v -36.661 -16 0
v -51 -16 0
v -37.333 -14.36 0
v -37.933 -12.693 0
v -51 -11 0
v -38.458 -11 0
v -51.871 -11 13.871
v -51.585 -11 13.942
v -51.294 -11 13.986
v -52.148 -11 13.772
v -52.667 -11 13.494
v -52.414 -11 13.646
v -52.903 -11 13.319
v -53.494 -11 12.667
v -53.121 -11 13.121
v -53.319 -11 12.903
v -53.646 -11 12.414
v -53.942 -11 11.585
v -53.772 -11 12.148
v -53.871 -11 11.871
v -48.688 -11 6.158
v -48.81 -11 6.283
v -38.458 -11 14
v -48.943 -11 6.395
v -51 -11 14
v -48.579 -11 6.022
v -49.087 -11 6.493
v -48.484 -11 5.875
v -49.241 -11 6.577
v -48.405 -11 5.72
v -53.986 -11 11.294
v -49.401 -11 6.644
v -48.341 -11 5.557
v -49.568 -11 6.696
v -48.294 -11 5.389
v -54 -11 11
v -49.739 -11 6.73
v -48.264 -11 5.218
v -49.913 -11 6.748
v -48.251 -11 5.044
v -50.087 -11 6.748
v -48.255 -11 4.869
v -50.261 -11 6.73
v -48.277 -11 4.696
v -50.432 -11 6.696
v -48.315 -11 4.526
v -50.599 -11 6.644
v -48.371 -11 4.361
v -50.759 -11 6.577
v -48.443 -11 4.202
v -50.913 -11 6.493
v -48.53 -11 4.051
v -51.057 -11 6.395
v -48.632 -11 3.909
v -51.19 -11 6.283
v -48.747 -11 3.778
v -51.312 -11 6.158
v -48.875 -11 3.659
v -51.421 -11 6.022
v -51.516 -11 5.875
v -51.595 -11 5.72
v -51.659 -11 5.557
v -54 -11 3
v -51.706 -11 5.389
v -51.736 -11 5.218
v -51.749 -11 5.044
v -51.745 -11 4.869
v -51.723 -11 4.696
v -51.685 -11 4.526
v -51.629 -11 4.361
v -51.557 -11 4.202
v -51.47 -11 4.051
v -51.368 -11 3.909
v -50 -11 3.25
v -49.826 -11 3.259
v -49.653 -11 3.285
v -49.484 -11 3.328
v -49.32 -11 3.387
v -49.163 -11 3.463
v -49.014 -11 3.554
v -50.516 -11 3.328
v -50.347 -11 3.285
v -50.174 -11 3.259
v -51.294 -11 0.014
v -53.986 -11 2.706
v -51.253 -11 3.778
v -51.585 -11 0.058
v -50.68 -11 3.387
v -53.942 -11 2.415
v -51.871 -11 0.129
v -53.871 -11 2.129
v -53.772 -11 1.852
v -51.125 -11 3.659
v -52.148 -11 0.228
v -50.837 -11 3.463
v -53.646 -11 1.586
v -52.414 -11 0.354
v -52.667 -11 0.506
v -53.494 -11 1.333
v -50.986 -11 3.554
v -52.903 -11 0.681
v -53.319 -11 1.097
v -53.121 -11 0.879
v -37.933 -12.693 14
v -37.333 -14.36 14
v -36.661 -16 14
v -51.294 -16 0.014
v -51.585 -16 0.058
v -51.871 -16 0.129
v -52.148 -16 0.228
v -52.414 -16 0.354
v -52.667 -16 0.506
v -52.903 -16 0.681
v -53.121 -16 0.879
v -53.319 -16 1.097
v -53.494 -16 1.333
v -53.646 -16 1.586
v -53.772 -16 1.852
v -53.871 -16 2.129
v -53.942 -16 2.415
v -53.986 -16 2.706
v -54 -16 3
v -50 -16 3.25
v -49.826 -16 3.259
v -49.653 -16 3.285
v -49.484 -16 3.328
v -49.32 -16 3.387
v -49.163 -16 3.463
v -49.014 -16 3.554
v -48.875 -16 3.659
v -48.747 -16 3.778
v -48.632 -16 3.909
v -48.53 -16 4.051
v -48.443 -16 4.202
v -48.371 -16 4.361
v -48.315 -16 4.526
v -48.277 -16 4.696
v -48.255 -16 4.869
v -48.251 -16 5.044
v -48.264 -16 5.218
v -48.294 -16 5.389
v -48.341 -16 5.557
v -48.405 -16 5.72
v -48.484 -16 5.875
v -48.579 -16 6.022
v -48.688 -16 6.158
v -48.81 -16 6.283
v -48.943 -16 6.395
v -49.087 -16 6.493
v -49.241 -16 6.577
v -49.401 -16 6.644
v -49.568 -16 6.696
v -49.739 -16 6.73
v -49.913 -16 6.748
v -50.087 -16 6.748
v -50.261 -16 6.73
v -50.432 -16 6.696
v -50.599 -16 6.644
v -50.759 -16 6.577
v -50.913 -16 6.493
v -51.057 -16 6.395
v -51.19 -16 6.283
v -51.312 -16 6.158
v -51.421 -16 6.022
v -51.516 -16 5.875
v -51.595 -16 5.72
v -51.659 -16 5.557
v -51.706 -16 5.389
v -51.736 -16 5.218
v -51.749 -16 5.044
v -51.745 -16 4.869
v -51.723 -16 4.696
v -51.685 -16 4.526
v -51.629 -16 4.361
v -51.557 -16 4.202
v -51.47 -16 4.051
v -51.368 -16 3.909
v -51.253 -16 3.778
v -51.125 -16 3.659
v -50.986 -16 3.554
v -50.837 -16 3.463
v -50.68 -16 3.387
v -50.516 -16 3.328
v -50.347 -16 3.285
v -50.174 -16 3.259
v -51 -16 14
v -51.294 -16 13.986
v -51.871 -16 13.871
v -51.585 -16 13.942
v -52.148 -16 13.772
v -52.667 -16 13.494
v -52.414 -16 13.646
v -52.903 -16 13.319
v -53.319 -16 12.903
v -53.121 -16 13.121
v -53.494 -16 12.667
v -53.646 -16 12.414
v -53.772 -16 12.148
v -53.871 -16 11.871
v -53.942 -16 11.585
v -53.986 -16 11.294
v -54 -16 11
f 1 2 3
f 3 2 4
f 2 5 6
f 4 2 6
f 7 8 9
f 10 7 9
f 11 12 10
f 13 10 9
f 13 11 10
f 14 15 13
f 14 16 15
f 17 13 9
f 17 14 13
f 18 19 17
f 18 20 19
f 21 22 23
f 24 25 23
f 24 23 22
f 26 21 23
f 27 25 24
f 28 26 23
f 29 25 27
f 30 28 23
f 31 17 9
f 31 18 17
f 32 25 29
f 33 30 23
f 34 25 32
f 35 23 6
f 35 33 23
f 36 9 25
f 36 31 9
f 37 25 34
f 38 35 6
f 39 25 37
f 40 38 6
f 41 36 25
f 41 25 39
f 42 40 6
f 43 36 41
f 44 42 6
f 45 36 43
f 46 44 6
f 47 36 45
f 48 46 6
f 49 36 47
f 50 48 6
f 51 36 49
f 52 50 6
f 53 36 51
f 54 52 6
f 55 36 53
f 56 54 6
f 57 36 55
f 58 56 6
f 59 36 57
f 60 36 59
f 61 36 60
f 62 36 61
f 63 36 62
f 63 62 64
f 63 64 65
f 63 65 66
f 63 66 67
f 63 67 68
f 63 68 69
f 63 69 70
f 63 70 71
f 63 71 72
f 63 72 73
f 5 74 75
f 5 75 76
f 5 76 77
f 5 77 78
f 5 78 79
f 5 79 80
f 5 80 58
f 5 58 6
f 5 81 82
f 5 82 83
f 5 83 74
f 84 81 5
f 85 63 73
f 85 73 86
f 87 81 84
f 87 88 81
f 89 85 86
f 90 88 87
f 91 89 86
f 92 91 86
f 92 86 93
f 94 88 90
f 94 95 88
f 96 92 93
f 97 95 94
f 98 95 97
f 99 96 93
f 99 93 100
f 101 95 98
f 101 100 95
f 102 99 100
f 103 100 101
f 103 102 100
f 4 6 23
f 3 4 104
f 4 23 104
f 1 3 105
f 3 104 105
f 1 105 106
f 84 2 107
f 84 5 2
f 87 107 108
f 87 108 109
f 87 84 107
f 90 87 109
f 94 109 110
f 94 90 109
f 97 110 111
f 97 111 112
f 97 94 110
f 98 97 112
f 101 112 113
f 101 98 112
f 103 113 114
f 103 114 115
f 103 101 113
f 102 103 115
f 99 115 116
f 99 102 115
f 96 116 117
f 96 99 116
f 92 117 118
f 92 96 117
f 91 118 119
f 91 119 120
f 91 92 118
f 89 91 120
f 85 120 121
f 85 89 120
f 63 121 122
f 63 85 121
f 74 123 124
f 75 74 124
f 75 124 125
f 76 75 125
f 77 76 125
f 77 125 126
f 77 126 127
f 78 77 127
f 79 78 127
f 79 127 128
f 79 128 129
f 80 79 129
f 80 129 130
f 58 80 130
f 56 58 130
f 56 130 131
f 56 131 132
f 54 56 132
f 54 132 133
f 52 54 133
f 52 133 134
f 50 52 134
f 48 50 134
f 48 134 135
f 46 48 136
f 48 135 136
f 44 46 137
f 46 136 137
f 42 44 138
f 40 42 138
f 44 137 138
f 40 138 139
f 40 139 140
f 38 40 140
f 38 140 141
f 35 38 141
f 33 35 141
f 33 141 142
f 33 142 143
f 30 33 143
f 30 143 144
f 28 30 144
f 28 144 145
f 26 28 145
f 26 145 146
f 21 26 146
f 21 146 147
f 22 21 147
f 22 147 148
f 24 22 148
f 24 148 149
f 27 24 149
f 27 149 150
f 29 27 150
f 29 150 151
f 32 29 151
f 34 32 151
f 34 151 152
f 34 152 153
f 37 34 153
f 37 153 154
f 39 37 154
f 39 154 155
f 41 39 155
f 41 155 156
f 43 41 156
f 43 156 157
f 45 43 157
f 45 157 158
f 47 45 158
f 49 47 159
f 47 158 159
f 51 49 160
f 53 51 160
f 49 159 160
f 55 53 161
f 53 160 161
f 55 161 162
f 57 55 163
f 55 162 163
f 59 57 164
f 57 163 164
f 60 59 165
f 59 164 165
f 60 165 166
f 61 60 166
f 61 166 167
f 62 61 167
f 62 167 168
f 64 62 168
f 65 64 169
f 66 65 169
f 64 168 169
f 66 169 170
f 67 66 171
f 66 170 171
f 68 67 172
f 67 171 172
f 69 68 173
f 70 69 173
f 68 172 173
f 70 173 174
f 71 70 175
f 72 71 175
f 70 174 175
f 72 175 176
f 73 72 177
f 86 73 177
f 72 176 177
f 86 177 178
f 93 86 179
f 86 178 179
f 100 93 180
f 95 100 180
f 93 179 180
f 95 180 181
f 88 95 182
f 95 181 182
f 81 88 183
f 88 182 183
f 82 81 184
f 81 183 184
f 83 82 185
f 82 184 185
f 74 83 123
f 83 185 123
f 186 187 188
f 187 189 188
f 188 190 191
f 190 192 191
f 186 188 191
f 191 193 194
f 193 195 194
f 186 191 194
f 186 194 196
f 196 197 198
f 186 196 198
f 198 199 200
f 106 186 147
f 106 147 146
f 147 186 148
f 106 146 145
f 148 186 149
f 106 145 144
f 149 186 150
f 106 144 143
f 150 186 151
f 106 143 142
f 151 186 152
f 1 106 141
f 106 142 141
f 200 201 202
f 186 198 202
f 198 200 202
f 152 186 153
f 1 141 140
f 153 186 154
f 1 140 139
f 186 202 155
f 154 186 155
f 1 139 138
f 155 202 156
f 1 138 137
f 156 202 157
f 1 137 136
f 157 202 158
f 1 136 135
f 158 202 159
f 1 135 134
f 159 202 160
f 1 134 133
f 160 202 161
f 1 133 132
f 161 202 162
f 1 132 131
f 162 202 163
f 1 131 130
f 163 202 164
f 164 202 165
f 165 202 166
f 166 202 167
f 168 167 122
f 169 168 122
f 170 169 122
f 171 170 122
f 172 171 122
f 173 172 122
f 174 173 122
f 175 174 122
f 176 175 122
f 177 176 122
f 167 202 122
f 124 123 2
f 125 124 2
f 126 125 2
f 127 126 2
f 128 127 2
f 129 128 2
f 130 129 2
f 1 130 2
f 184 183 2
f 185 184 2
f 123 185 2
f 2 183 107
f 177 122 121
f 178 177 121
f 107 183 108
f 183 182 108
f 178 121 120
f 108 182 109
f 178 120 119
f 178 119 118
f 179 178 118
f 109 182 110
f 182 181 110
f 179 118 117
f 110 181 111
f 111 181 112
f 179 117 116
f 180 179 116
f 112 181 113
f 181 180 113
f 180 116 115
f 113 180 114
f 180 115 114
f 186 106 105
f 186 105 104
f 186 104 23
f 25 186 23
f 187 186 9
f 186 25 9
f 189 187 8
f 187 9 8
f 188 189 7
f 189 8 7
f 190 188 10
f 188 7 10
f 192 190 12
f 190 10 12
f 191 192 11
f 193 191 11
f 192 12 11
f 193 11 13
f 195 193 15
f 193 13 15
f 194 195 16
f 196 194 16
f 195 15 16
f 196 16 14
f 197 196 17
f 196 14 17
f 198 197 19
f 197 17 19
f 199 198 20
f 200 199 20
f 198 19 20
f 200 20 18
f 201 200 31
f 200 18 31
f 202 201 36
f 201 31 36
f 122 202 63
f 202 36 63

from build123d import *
from build123d.topology import SkipClean

# Parameters (mm, degrees)
SKETCH1_R                      = 40
SKETCH1_R_2                    = 38
BOSS_EXTRUDE1_DEPTH            = 200
SKETCH2_R                      = 40
BOSS_EXTRUDE2_DEPTH            = 2
BOSS_EXTRUDE3_DEPTH            = 107
BOSS_EXTRUDE4_DEPTH            = 2
SKETCH5_R                      = 1.75
CUT_EXTRUDE1_DEPTH             = 225.428162226
CUT_EXTRUDE2_REACH             = 218.296
SKETCH6_R                      = 4
CUT_EXTRUDE2_DIRECTION_2_REACH = 218.296
CIRPATTERN1_COUNT              = 2
CIRPATTERN1_ANGLE              = 90
BOSS_EXTRUDE5_REACH            = 241.742
BOSS_EXTRUDE5_END_RADIUS       = 40
SKETCH7_W                      = 14
SKETCH7_H                      = 5
CUT_EXTRUDE3_REACH             = 221.818
SKETCH8_R                      = 1.75
FILLET1_R                      = 3
CUT_EXTRUDE4_REACH             = 220.598
SKETCH9_R                      = 0.25
BOSS_EXTRUDE6_START            = 2
BOSS_EXTRUDE6_DEPTH            = 2
CUT_EXTRUDE5_REACH             = 220.147


with BuildPart() as part:
    # Sketch1 → Boss-Extrude1 (new body)
    with BuildSketch(Plane.XY):
        Circle(SKETCH1_R)
        Circle(SKETCH1_R_2, mode=Mode.SUBTRACT)
    extrude(amount=BOSS_EXTRUDE1_DEPTH)

    # Sketch2 → Boss-Extrude2 (add)
    with BuildSketch(Plane.XY.offset(180)):
        Circle(SKETCH2_R)
    extrude(amount=BOSS_EXTRUDE2_DEPTH)

    # Sketch3 → Boss-Extrude3 (add)
    with BuildSketch(Plane(origin=(0, 0, 0), x_dir=(-1, 0, 0), z_dir=(0, 0, -1))):
        with BuildLine():
            Line((-24, -32), (-72, -32))
            Line((-72, -32), (-72, -30))
            Line((-72, -30), (-26.457513111, -30))
            ThreePointArc((-26.457513111, -30), (-25.248567431, -31.024342744), (-24, -32))
        make_face()
        with BuildLine():
            Line((-24, 32), (-72, 32))
            Line((-72, 32), (-72, 30))
            Line((-72, 30), (-26.457513111, 30))
            ThreePointArc((-26.457513111, 30), (-25.248567431, 31.024342744), (-24, 32))
        make_face()
    extrude(amount=-BOSS_EXTRUDE3_DEPTH)

    # Sketch4 → Boss-Extrude4 (add)
    with BuildSketch(Plane.XY.offset(107)):
        with BuildLine():
            Line((72, -32), (24, -32))
            ThreePointArc((24, -32), (40, 0), (24, 32))
            Line((24, 32), (72, 32))
            Line((72, 32), (72, -32))
        make_face()
    extrude(amount=BOSS_EXTRUDE4_DEPTH)

    # Sketch5 → Cut-Extrude1 (cut, through all)
    with BuildSketch(Plane(origin=(0, 32, 0), x_dir=(1, 0, 0), z_dir=(0, 1, 0))):
        with Locations(Location((43.5, -102.5, 0), (0, 0, 270))):
            Circle(SKETCH5_R)
        with Locations(Location((43.5, -3.5, 0), (0, 0, 270))):
            Circle(SKETCH5_R)
        with Locations(Location((68.5, -78, 0), (0, 0, 270))):
            Circle(SKETCH5_R)
    extrude(amount=-CUT_EXTRUDE1_DEPTH, mode=Mode.SUBTRACT)

    # Sketch6 → Cut-Extrude2 (cut, up to next)
    with BuildSketch(Plane(origin=(0, 0, 0), x_dir=(0, 0, 1), z_dir=(-0.7071067811865488, 0.7071067811865464, 0)), mode=Mode.PRIVATE) as cut_extrude2_sk1:
        with Locations(Location((187, 0, 0), (0, 0, 90))):
            Circle(SKETCH6_R)
    cut_extrude2_tool1 = extrude(cut_extrude2_sk1.sketch, amount=-CUT_EXTRUDE2_REACH, mode=Mode.PRIVATE) & part.part
    cut_extrude2 = cut_extrude2_tool1.solids().sort_by_distance((0, 0, 187))[0]
    add(cut_extrude2, mode=Mode.SUBTRACT)

    # Sketch6 → Cut-Extrude2 direction 2 (cut, up to next)
    with BuildSketch(Plane(origin=(0, 0, 0), x_dir=(0, 0, 1), z_dir=(-0.7071067811865488, 0.7071067811865464, 0)), mode=Mode.PRIVATE) as cut_extrude2_direction_2_sk1:
        with Locations(Location((187, 0, 0), (0, 0, 90))):
            Circle(SKETCH6_R)
    cut_extrude2_direction_2_tool1 = extrude(cut_extrude2_direction_2_sk1.sketch, amount=CUT_EXTRUDE2_DIRECTION_2_REACH, mode=Mode.PRIVATE) & part.part
    cut_extrude2_direction_2 = cut_extrude2_direction_2_tool1.solids().sort_by_distance((0, 0, 187))[0]
    add(cut_extrude2_direction_2, mode=Mode.SUBTRACT)

    # CirPattern1: Cut-Extrude2, Cut-Extrude2 direction 2 ×2 about axis
    cirpattern1_axis = Axis((0, 0, -0.7), (0, 0, 1))
    add([cut_extrude2.rotate(cirpattern1_axis, i * CIRPATTERN1_ANGLE / (CIRPATTERN1_COUNT - 1)) for i in range(1, CIRPATTERN1_COUNT)], mode=Mode.SUBTRACT)
    add([cut_extrude2_direction_2.rotate(cirpattern1_axis, i * CIRPATTERN1_ANGLE / (CIRPATTERN1_COUNT - 1)) for i in range(1, CIRPATTERN1_COUNT)], mode=Mode.SUBTRACT)

    # Boss-Extrude5: up to this cylinder (the profile starts outside it)
    boss_extrude5_end = Plane(origin=(0, 0, 7), z_dir=(0, 0, -1)) * Cylinder(BOSS_EXTRUDE5_END_RADIUS, 564.484, mode=Mode.PRIVATE)
    # Sketch7 → Boss-Extrude5 (add, up to the surface)
    with BuildSketch(Plane(origin=(-54, 0, 0), x_dir=(0, 0, -1), z_dir=(1, 0, 0)), mode=Mode.PRIVATE) as boss_extrude5_sk1:
        with Locations((-7, -13.5)):
            Rectangle(SKETCH7_W, SKETCH7_H)
    boss_extrude5_tool1 = extrude(boss_extrude5_sk1.sketch, amount=BOSS_EXTRUDE5_REACH, mode=Mode.PRIVATE) - boss_extrude5_end
    add(boss_extrude5_tool1.solids().sort_by_distance((-54, -13.5, 7))[0])
    # Sketch7 → Boss-Extrude5 (add, up to the surface)
    with BuildSketch(Plane(origin=(-54, 0, 0), x_dir=(0, 0, -1), z_dir=(1, 0, 0)), mode=Mode.PRIVATE) as boss_extrude5_sk2:
        with Locations((-7, 13.5)):
            Rectangle(SKETCH7_W, SKETCH7_H)
    boss_extrude5_tool2 = extrude(boss_extrude5_sk2.sketch, amount=BOSS_EXTRUDE5_REACH, mode=Mode.PRIVATE) - boss_extrude5_end
    add(boss_extrude5_tool2.solids().sort_by_distance((-54, 13.5, 7))[0])

    # Cut-Extrude3: up to this face of the body (flat: up to its plane)
    cut_extrude3_end = Plane(part.part.faces().sort_by_distance((-45.33030278, 16, 7))[0])
    # Sketch8 → Cut-Extrude3 (cut, up to the picked face)
    with BuildSketch(Plane.XZ.offset(16), mode=Mode.PRIVATE) as cut_extrude3_sk1:
        with Locations(Location((-50, 5, 0), (0, 0, 270))):
            Circle(SKETCH8_R)
    cut_extrude3_tool1 = split(extrude(cut_extrude3_sk1.sketch, amount=-CUT_EXTRUDE3_REACH, mode=Mode.PRIVATE), bisect_by=cut_extrude3_end, keep=Keep.BOTH, mode=Mode.PRIVATE)
    add(cut_extrude3_tool1.solids().sort_by(Axis((-50, -16, 5), (0, 1, 0)))[0], mode=Mode.SUBTRACT)

    # Fillet1
    fillet1_edges = [part.edges().sort_by_distance(p)[0] for p in [
        (-54, -13.5, 14),
        (-54, -13.5, 0),
        (-54, 13.5, 0),
        (-54, 13.5, 14),
    ]]
    fillet(fillet1_edges, radius=FILLET1_R)

    # Sketch9 → Cut-Extrude4 (cut, up to next)
    with BuildSketch(Plane.XZ.offset(-11), mode=Mode.PRIVATE) as cut_extrude4_sk1:
        with Locations(Location((-44, 7, 0), (0, 0, 270))):
            Circle(SKETCH9_R)
    cut_extrude4_tool1 = extrude(cut_extrude4_sk1.sketch, amount=-CUT_EXTRUDE4_REACH, mode=Mode.PRIVATE) & part.part
    add(cut_extrude4_tool1.solids().sort_by_distance((-44, 11, 7))[0], mode=Mode.SUBTRACT)

    # Sketch10 → Boss-Extrude6 (add)
    with SkipClean():  # the faces are left unmerged after this step: merging them gives an invalid solid
        with BuildSketch(Plane(origin=(0, 0, 0), x_dir=(-1, 0, 0), z_dir=(0, 0, -1)).offset(BOSS_EXTRUDE6_START)):
            with BuildLine():
                ThreePointArc((10, -36.66060556), (0, -38), (-10, -36.66060556))
                Line((-10, -36.66060556), (-10, -38.729833462))
                ThreePointArc((-10, -38.729833462), (0, -40), (10, -38.729833462))
                Line((10, -38.729833462), (10, -36.66060556))
            make_face()
            with BuildLine():
                ThreePointArc((10, 38.729833462), (0, 40), (-10, 38.729833462))
                Line((-10, 38.729833462), (-10, 36.66060556))
                ThreePointArc((-10, 36.66060556), (0, 38), (10, 36.66060556))
                Line((10, 36.66060556), (10, 38.729833462))
            make_face()
        extrude(amount=-BOSS_EXTRUDE6_DEPTH)

    # Sketch11 → Cut-Extrude5 (cut, up to next)
    with BuildSketch(Plane.XY.offset(200), mode=Mode.PRIVATE) as cut_extrude5_sk1:
        with BuildLine():
            ThreePointArc((-39.953981252, 1.918171548), (-25.55703566, -30.770731683), (9.219033253, -38.923121996))
            ThreePointArc((9.219033253, -38.923121996), (103.998908328, 0), (9.219033253, 38.923121996))
            ThreePointArc((9.219033253, 38.923121996), (4.476281437, 39.748747207), (-0.331307503, 39.998627918))
            ThreePointArc((-0.331307503, 39.998627918), (-96.996927129, 100.925197981), (-39.953981252, 1.918171548))
        make_face()
    cut_extrude5_tool1 = extrude(cut_extrude5_sk1.sketch, amount=-CUT_EXTRUDE5_REACH, mode=Mode.PRIVATE) & part.part
    add(cut_extrude5_tool1.solids().sort_by_distance((-7.679141, 27.95673, 200))[0], mode=Mode.SUBTRACT)


solid = part.part
